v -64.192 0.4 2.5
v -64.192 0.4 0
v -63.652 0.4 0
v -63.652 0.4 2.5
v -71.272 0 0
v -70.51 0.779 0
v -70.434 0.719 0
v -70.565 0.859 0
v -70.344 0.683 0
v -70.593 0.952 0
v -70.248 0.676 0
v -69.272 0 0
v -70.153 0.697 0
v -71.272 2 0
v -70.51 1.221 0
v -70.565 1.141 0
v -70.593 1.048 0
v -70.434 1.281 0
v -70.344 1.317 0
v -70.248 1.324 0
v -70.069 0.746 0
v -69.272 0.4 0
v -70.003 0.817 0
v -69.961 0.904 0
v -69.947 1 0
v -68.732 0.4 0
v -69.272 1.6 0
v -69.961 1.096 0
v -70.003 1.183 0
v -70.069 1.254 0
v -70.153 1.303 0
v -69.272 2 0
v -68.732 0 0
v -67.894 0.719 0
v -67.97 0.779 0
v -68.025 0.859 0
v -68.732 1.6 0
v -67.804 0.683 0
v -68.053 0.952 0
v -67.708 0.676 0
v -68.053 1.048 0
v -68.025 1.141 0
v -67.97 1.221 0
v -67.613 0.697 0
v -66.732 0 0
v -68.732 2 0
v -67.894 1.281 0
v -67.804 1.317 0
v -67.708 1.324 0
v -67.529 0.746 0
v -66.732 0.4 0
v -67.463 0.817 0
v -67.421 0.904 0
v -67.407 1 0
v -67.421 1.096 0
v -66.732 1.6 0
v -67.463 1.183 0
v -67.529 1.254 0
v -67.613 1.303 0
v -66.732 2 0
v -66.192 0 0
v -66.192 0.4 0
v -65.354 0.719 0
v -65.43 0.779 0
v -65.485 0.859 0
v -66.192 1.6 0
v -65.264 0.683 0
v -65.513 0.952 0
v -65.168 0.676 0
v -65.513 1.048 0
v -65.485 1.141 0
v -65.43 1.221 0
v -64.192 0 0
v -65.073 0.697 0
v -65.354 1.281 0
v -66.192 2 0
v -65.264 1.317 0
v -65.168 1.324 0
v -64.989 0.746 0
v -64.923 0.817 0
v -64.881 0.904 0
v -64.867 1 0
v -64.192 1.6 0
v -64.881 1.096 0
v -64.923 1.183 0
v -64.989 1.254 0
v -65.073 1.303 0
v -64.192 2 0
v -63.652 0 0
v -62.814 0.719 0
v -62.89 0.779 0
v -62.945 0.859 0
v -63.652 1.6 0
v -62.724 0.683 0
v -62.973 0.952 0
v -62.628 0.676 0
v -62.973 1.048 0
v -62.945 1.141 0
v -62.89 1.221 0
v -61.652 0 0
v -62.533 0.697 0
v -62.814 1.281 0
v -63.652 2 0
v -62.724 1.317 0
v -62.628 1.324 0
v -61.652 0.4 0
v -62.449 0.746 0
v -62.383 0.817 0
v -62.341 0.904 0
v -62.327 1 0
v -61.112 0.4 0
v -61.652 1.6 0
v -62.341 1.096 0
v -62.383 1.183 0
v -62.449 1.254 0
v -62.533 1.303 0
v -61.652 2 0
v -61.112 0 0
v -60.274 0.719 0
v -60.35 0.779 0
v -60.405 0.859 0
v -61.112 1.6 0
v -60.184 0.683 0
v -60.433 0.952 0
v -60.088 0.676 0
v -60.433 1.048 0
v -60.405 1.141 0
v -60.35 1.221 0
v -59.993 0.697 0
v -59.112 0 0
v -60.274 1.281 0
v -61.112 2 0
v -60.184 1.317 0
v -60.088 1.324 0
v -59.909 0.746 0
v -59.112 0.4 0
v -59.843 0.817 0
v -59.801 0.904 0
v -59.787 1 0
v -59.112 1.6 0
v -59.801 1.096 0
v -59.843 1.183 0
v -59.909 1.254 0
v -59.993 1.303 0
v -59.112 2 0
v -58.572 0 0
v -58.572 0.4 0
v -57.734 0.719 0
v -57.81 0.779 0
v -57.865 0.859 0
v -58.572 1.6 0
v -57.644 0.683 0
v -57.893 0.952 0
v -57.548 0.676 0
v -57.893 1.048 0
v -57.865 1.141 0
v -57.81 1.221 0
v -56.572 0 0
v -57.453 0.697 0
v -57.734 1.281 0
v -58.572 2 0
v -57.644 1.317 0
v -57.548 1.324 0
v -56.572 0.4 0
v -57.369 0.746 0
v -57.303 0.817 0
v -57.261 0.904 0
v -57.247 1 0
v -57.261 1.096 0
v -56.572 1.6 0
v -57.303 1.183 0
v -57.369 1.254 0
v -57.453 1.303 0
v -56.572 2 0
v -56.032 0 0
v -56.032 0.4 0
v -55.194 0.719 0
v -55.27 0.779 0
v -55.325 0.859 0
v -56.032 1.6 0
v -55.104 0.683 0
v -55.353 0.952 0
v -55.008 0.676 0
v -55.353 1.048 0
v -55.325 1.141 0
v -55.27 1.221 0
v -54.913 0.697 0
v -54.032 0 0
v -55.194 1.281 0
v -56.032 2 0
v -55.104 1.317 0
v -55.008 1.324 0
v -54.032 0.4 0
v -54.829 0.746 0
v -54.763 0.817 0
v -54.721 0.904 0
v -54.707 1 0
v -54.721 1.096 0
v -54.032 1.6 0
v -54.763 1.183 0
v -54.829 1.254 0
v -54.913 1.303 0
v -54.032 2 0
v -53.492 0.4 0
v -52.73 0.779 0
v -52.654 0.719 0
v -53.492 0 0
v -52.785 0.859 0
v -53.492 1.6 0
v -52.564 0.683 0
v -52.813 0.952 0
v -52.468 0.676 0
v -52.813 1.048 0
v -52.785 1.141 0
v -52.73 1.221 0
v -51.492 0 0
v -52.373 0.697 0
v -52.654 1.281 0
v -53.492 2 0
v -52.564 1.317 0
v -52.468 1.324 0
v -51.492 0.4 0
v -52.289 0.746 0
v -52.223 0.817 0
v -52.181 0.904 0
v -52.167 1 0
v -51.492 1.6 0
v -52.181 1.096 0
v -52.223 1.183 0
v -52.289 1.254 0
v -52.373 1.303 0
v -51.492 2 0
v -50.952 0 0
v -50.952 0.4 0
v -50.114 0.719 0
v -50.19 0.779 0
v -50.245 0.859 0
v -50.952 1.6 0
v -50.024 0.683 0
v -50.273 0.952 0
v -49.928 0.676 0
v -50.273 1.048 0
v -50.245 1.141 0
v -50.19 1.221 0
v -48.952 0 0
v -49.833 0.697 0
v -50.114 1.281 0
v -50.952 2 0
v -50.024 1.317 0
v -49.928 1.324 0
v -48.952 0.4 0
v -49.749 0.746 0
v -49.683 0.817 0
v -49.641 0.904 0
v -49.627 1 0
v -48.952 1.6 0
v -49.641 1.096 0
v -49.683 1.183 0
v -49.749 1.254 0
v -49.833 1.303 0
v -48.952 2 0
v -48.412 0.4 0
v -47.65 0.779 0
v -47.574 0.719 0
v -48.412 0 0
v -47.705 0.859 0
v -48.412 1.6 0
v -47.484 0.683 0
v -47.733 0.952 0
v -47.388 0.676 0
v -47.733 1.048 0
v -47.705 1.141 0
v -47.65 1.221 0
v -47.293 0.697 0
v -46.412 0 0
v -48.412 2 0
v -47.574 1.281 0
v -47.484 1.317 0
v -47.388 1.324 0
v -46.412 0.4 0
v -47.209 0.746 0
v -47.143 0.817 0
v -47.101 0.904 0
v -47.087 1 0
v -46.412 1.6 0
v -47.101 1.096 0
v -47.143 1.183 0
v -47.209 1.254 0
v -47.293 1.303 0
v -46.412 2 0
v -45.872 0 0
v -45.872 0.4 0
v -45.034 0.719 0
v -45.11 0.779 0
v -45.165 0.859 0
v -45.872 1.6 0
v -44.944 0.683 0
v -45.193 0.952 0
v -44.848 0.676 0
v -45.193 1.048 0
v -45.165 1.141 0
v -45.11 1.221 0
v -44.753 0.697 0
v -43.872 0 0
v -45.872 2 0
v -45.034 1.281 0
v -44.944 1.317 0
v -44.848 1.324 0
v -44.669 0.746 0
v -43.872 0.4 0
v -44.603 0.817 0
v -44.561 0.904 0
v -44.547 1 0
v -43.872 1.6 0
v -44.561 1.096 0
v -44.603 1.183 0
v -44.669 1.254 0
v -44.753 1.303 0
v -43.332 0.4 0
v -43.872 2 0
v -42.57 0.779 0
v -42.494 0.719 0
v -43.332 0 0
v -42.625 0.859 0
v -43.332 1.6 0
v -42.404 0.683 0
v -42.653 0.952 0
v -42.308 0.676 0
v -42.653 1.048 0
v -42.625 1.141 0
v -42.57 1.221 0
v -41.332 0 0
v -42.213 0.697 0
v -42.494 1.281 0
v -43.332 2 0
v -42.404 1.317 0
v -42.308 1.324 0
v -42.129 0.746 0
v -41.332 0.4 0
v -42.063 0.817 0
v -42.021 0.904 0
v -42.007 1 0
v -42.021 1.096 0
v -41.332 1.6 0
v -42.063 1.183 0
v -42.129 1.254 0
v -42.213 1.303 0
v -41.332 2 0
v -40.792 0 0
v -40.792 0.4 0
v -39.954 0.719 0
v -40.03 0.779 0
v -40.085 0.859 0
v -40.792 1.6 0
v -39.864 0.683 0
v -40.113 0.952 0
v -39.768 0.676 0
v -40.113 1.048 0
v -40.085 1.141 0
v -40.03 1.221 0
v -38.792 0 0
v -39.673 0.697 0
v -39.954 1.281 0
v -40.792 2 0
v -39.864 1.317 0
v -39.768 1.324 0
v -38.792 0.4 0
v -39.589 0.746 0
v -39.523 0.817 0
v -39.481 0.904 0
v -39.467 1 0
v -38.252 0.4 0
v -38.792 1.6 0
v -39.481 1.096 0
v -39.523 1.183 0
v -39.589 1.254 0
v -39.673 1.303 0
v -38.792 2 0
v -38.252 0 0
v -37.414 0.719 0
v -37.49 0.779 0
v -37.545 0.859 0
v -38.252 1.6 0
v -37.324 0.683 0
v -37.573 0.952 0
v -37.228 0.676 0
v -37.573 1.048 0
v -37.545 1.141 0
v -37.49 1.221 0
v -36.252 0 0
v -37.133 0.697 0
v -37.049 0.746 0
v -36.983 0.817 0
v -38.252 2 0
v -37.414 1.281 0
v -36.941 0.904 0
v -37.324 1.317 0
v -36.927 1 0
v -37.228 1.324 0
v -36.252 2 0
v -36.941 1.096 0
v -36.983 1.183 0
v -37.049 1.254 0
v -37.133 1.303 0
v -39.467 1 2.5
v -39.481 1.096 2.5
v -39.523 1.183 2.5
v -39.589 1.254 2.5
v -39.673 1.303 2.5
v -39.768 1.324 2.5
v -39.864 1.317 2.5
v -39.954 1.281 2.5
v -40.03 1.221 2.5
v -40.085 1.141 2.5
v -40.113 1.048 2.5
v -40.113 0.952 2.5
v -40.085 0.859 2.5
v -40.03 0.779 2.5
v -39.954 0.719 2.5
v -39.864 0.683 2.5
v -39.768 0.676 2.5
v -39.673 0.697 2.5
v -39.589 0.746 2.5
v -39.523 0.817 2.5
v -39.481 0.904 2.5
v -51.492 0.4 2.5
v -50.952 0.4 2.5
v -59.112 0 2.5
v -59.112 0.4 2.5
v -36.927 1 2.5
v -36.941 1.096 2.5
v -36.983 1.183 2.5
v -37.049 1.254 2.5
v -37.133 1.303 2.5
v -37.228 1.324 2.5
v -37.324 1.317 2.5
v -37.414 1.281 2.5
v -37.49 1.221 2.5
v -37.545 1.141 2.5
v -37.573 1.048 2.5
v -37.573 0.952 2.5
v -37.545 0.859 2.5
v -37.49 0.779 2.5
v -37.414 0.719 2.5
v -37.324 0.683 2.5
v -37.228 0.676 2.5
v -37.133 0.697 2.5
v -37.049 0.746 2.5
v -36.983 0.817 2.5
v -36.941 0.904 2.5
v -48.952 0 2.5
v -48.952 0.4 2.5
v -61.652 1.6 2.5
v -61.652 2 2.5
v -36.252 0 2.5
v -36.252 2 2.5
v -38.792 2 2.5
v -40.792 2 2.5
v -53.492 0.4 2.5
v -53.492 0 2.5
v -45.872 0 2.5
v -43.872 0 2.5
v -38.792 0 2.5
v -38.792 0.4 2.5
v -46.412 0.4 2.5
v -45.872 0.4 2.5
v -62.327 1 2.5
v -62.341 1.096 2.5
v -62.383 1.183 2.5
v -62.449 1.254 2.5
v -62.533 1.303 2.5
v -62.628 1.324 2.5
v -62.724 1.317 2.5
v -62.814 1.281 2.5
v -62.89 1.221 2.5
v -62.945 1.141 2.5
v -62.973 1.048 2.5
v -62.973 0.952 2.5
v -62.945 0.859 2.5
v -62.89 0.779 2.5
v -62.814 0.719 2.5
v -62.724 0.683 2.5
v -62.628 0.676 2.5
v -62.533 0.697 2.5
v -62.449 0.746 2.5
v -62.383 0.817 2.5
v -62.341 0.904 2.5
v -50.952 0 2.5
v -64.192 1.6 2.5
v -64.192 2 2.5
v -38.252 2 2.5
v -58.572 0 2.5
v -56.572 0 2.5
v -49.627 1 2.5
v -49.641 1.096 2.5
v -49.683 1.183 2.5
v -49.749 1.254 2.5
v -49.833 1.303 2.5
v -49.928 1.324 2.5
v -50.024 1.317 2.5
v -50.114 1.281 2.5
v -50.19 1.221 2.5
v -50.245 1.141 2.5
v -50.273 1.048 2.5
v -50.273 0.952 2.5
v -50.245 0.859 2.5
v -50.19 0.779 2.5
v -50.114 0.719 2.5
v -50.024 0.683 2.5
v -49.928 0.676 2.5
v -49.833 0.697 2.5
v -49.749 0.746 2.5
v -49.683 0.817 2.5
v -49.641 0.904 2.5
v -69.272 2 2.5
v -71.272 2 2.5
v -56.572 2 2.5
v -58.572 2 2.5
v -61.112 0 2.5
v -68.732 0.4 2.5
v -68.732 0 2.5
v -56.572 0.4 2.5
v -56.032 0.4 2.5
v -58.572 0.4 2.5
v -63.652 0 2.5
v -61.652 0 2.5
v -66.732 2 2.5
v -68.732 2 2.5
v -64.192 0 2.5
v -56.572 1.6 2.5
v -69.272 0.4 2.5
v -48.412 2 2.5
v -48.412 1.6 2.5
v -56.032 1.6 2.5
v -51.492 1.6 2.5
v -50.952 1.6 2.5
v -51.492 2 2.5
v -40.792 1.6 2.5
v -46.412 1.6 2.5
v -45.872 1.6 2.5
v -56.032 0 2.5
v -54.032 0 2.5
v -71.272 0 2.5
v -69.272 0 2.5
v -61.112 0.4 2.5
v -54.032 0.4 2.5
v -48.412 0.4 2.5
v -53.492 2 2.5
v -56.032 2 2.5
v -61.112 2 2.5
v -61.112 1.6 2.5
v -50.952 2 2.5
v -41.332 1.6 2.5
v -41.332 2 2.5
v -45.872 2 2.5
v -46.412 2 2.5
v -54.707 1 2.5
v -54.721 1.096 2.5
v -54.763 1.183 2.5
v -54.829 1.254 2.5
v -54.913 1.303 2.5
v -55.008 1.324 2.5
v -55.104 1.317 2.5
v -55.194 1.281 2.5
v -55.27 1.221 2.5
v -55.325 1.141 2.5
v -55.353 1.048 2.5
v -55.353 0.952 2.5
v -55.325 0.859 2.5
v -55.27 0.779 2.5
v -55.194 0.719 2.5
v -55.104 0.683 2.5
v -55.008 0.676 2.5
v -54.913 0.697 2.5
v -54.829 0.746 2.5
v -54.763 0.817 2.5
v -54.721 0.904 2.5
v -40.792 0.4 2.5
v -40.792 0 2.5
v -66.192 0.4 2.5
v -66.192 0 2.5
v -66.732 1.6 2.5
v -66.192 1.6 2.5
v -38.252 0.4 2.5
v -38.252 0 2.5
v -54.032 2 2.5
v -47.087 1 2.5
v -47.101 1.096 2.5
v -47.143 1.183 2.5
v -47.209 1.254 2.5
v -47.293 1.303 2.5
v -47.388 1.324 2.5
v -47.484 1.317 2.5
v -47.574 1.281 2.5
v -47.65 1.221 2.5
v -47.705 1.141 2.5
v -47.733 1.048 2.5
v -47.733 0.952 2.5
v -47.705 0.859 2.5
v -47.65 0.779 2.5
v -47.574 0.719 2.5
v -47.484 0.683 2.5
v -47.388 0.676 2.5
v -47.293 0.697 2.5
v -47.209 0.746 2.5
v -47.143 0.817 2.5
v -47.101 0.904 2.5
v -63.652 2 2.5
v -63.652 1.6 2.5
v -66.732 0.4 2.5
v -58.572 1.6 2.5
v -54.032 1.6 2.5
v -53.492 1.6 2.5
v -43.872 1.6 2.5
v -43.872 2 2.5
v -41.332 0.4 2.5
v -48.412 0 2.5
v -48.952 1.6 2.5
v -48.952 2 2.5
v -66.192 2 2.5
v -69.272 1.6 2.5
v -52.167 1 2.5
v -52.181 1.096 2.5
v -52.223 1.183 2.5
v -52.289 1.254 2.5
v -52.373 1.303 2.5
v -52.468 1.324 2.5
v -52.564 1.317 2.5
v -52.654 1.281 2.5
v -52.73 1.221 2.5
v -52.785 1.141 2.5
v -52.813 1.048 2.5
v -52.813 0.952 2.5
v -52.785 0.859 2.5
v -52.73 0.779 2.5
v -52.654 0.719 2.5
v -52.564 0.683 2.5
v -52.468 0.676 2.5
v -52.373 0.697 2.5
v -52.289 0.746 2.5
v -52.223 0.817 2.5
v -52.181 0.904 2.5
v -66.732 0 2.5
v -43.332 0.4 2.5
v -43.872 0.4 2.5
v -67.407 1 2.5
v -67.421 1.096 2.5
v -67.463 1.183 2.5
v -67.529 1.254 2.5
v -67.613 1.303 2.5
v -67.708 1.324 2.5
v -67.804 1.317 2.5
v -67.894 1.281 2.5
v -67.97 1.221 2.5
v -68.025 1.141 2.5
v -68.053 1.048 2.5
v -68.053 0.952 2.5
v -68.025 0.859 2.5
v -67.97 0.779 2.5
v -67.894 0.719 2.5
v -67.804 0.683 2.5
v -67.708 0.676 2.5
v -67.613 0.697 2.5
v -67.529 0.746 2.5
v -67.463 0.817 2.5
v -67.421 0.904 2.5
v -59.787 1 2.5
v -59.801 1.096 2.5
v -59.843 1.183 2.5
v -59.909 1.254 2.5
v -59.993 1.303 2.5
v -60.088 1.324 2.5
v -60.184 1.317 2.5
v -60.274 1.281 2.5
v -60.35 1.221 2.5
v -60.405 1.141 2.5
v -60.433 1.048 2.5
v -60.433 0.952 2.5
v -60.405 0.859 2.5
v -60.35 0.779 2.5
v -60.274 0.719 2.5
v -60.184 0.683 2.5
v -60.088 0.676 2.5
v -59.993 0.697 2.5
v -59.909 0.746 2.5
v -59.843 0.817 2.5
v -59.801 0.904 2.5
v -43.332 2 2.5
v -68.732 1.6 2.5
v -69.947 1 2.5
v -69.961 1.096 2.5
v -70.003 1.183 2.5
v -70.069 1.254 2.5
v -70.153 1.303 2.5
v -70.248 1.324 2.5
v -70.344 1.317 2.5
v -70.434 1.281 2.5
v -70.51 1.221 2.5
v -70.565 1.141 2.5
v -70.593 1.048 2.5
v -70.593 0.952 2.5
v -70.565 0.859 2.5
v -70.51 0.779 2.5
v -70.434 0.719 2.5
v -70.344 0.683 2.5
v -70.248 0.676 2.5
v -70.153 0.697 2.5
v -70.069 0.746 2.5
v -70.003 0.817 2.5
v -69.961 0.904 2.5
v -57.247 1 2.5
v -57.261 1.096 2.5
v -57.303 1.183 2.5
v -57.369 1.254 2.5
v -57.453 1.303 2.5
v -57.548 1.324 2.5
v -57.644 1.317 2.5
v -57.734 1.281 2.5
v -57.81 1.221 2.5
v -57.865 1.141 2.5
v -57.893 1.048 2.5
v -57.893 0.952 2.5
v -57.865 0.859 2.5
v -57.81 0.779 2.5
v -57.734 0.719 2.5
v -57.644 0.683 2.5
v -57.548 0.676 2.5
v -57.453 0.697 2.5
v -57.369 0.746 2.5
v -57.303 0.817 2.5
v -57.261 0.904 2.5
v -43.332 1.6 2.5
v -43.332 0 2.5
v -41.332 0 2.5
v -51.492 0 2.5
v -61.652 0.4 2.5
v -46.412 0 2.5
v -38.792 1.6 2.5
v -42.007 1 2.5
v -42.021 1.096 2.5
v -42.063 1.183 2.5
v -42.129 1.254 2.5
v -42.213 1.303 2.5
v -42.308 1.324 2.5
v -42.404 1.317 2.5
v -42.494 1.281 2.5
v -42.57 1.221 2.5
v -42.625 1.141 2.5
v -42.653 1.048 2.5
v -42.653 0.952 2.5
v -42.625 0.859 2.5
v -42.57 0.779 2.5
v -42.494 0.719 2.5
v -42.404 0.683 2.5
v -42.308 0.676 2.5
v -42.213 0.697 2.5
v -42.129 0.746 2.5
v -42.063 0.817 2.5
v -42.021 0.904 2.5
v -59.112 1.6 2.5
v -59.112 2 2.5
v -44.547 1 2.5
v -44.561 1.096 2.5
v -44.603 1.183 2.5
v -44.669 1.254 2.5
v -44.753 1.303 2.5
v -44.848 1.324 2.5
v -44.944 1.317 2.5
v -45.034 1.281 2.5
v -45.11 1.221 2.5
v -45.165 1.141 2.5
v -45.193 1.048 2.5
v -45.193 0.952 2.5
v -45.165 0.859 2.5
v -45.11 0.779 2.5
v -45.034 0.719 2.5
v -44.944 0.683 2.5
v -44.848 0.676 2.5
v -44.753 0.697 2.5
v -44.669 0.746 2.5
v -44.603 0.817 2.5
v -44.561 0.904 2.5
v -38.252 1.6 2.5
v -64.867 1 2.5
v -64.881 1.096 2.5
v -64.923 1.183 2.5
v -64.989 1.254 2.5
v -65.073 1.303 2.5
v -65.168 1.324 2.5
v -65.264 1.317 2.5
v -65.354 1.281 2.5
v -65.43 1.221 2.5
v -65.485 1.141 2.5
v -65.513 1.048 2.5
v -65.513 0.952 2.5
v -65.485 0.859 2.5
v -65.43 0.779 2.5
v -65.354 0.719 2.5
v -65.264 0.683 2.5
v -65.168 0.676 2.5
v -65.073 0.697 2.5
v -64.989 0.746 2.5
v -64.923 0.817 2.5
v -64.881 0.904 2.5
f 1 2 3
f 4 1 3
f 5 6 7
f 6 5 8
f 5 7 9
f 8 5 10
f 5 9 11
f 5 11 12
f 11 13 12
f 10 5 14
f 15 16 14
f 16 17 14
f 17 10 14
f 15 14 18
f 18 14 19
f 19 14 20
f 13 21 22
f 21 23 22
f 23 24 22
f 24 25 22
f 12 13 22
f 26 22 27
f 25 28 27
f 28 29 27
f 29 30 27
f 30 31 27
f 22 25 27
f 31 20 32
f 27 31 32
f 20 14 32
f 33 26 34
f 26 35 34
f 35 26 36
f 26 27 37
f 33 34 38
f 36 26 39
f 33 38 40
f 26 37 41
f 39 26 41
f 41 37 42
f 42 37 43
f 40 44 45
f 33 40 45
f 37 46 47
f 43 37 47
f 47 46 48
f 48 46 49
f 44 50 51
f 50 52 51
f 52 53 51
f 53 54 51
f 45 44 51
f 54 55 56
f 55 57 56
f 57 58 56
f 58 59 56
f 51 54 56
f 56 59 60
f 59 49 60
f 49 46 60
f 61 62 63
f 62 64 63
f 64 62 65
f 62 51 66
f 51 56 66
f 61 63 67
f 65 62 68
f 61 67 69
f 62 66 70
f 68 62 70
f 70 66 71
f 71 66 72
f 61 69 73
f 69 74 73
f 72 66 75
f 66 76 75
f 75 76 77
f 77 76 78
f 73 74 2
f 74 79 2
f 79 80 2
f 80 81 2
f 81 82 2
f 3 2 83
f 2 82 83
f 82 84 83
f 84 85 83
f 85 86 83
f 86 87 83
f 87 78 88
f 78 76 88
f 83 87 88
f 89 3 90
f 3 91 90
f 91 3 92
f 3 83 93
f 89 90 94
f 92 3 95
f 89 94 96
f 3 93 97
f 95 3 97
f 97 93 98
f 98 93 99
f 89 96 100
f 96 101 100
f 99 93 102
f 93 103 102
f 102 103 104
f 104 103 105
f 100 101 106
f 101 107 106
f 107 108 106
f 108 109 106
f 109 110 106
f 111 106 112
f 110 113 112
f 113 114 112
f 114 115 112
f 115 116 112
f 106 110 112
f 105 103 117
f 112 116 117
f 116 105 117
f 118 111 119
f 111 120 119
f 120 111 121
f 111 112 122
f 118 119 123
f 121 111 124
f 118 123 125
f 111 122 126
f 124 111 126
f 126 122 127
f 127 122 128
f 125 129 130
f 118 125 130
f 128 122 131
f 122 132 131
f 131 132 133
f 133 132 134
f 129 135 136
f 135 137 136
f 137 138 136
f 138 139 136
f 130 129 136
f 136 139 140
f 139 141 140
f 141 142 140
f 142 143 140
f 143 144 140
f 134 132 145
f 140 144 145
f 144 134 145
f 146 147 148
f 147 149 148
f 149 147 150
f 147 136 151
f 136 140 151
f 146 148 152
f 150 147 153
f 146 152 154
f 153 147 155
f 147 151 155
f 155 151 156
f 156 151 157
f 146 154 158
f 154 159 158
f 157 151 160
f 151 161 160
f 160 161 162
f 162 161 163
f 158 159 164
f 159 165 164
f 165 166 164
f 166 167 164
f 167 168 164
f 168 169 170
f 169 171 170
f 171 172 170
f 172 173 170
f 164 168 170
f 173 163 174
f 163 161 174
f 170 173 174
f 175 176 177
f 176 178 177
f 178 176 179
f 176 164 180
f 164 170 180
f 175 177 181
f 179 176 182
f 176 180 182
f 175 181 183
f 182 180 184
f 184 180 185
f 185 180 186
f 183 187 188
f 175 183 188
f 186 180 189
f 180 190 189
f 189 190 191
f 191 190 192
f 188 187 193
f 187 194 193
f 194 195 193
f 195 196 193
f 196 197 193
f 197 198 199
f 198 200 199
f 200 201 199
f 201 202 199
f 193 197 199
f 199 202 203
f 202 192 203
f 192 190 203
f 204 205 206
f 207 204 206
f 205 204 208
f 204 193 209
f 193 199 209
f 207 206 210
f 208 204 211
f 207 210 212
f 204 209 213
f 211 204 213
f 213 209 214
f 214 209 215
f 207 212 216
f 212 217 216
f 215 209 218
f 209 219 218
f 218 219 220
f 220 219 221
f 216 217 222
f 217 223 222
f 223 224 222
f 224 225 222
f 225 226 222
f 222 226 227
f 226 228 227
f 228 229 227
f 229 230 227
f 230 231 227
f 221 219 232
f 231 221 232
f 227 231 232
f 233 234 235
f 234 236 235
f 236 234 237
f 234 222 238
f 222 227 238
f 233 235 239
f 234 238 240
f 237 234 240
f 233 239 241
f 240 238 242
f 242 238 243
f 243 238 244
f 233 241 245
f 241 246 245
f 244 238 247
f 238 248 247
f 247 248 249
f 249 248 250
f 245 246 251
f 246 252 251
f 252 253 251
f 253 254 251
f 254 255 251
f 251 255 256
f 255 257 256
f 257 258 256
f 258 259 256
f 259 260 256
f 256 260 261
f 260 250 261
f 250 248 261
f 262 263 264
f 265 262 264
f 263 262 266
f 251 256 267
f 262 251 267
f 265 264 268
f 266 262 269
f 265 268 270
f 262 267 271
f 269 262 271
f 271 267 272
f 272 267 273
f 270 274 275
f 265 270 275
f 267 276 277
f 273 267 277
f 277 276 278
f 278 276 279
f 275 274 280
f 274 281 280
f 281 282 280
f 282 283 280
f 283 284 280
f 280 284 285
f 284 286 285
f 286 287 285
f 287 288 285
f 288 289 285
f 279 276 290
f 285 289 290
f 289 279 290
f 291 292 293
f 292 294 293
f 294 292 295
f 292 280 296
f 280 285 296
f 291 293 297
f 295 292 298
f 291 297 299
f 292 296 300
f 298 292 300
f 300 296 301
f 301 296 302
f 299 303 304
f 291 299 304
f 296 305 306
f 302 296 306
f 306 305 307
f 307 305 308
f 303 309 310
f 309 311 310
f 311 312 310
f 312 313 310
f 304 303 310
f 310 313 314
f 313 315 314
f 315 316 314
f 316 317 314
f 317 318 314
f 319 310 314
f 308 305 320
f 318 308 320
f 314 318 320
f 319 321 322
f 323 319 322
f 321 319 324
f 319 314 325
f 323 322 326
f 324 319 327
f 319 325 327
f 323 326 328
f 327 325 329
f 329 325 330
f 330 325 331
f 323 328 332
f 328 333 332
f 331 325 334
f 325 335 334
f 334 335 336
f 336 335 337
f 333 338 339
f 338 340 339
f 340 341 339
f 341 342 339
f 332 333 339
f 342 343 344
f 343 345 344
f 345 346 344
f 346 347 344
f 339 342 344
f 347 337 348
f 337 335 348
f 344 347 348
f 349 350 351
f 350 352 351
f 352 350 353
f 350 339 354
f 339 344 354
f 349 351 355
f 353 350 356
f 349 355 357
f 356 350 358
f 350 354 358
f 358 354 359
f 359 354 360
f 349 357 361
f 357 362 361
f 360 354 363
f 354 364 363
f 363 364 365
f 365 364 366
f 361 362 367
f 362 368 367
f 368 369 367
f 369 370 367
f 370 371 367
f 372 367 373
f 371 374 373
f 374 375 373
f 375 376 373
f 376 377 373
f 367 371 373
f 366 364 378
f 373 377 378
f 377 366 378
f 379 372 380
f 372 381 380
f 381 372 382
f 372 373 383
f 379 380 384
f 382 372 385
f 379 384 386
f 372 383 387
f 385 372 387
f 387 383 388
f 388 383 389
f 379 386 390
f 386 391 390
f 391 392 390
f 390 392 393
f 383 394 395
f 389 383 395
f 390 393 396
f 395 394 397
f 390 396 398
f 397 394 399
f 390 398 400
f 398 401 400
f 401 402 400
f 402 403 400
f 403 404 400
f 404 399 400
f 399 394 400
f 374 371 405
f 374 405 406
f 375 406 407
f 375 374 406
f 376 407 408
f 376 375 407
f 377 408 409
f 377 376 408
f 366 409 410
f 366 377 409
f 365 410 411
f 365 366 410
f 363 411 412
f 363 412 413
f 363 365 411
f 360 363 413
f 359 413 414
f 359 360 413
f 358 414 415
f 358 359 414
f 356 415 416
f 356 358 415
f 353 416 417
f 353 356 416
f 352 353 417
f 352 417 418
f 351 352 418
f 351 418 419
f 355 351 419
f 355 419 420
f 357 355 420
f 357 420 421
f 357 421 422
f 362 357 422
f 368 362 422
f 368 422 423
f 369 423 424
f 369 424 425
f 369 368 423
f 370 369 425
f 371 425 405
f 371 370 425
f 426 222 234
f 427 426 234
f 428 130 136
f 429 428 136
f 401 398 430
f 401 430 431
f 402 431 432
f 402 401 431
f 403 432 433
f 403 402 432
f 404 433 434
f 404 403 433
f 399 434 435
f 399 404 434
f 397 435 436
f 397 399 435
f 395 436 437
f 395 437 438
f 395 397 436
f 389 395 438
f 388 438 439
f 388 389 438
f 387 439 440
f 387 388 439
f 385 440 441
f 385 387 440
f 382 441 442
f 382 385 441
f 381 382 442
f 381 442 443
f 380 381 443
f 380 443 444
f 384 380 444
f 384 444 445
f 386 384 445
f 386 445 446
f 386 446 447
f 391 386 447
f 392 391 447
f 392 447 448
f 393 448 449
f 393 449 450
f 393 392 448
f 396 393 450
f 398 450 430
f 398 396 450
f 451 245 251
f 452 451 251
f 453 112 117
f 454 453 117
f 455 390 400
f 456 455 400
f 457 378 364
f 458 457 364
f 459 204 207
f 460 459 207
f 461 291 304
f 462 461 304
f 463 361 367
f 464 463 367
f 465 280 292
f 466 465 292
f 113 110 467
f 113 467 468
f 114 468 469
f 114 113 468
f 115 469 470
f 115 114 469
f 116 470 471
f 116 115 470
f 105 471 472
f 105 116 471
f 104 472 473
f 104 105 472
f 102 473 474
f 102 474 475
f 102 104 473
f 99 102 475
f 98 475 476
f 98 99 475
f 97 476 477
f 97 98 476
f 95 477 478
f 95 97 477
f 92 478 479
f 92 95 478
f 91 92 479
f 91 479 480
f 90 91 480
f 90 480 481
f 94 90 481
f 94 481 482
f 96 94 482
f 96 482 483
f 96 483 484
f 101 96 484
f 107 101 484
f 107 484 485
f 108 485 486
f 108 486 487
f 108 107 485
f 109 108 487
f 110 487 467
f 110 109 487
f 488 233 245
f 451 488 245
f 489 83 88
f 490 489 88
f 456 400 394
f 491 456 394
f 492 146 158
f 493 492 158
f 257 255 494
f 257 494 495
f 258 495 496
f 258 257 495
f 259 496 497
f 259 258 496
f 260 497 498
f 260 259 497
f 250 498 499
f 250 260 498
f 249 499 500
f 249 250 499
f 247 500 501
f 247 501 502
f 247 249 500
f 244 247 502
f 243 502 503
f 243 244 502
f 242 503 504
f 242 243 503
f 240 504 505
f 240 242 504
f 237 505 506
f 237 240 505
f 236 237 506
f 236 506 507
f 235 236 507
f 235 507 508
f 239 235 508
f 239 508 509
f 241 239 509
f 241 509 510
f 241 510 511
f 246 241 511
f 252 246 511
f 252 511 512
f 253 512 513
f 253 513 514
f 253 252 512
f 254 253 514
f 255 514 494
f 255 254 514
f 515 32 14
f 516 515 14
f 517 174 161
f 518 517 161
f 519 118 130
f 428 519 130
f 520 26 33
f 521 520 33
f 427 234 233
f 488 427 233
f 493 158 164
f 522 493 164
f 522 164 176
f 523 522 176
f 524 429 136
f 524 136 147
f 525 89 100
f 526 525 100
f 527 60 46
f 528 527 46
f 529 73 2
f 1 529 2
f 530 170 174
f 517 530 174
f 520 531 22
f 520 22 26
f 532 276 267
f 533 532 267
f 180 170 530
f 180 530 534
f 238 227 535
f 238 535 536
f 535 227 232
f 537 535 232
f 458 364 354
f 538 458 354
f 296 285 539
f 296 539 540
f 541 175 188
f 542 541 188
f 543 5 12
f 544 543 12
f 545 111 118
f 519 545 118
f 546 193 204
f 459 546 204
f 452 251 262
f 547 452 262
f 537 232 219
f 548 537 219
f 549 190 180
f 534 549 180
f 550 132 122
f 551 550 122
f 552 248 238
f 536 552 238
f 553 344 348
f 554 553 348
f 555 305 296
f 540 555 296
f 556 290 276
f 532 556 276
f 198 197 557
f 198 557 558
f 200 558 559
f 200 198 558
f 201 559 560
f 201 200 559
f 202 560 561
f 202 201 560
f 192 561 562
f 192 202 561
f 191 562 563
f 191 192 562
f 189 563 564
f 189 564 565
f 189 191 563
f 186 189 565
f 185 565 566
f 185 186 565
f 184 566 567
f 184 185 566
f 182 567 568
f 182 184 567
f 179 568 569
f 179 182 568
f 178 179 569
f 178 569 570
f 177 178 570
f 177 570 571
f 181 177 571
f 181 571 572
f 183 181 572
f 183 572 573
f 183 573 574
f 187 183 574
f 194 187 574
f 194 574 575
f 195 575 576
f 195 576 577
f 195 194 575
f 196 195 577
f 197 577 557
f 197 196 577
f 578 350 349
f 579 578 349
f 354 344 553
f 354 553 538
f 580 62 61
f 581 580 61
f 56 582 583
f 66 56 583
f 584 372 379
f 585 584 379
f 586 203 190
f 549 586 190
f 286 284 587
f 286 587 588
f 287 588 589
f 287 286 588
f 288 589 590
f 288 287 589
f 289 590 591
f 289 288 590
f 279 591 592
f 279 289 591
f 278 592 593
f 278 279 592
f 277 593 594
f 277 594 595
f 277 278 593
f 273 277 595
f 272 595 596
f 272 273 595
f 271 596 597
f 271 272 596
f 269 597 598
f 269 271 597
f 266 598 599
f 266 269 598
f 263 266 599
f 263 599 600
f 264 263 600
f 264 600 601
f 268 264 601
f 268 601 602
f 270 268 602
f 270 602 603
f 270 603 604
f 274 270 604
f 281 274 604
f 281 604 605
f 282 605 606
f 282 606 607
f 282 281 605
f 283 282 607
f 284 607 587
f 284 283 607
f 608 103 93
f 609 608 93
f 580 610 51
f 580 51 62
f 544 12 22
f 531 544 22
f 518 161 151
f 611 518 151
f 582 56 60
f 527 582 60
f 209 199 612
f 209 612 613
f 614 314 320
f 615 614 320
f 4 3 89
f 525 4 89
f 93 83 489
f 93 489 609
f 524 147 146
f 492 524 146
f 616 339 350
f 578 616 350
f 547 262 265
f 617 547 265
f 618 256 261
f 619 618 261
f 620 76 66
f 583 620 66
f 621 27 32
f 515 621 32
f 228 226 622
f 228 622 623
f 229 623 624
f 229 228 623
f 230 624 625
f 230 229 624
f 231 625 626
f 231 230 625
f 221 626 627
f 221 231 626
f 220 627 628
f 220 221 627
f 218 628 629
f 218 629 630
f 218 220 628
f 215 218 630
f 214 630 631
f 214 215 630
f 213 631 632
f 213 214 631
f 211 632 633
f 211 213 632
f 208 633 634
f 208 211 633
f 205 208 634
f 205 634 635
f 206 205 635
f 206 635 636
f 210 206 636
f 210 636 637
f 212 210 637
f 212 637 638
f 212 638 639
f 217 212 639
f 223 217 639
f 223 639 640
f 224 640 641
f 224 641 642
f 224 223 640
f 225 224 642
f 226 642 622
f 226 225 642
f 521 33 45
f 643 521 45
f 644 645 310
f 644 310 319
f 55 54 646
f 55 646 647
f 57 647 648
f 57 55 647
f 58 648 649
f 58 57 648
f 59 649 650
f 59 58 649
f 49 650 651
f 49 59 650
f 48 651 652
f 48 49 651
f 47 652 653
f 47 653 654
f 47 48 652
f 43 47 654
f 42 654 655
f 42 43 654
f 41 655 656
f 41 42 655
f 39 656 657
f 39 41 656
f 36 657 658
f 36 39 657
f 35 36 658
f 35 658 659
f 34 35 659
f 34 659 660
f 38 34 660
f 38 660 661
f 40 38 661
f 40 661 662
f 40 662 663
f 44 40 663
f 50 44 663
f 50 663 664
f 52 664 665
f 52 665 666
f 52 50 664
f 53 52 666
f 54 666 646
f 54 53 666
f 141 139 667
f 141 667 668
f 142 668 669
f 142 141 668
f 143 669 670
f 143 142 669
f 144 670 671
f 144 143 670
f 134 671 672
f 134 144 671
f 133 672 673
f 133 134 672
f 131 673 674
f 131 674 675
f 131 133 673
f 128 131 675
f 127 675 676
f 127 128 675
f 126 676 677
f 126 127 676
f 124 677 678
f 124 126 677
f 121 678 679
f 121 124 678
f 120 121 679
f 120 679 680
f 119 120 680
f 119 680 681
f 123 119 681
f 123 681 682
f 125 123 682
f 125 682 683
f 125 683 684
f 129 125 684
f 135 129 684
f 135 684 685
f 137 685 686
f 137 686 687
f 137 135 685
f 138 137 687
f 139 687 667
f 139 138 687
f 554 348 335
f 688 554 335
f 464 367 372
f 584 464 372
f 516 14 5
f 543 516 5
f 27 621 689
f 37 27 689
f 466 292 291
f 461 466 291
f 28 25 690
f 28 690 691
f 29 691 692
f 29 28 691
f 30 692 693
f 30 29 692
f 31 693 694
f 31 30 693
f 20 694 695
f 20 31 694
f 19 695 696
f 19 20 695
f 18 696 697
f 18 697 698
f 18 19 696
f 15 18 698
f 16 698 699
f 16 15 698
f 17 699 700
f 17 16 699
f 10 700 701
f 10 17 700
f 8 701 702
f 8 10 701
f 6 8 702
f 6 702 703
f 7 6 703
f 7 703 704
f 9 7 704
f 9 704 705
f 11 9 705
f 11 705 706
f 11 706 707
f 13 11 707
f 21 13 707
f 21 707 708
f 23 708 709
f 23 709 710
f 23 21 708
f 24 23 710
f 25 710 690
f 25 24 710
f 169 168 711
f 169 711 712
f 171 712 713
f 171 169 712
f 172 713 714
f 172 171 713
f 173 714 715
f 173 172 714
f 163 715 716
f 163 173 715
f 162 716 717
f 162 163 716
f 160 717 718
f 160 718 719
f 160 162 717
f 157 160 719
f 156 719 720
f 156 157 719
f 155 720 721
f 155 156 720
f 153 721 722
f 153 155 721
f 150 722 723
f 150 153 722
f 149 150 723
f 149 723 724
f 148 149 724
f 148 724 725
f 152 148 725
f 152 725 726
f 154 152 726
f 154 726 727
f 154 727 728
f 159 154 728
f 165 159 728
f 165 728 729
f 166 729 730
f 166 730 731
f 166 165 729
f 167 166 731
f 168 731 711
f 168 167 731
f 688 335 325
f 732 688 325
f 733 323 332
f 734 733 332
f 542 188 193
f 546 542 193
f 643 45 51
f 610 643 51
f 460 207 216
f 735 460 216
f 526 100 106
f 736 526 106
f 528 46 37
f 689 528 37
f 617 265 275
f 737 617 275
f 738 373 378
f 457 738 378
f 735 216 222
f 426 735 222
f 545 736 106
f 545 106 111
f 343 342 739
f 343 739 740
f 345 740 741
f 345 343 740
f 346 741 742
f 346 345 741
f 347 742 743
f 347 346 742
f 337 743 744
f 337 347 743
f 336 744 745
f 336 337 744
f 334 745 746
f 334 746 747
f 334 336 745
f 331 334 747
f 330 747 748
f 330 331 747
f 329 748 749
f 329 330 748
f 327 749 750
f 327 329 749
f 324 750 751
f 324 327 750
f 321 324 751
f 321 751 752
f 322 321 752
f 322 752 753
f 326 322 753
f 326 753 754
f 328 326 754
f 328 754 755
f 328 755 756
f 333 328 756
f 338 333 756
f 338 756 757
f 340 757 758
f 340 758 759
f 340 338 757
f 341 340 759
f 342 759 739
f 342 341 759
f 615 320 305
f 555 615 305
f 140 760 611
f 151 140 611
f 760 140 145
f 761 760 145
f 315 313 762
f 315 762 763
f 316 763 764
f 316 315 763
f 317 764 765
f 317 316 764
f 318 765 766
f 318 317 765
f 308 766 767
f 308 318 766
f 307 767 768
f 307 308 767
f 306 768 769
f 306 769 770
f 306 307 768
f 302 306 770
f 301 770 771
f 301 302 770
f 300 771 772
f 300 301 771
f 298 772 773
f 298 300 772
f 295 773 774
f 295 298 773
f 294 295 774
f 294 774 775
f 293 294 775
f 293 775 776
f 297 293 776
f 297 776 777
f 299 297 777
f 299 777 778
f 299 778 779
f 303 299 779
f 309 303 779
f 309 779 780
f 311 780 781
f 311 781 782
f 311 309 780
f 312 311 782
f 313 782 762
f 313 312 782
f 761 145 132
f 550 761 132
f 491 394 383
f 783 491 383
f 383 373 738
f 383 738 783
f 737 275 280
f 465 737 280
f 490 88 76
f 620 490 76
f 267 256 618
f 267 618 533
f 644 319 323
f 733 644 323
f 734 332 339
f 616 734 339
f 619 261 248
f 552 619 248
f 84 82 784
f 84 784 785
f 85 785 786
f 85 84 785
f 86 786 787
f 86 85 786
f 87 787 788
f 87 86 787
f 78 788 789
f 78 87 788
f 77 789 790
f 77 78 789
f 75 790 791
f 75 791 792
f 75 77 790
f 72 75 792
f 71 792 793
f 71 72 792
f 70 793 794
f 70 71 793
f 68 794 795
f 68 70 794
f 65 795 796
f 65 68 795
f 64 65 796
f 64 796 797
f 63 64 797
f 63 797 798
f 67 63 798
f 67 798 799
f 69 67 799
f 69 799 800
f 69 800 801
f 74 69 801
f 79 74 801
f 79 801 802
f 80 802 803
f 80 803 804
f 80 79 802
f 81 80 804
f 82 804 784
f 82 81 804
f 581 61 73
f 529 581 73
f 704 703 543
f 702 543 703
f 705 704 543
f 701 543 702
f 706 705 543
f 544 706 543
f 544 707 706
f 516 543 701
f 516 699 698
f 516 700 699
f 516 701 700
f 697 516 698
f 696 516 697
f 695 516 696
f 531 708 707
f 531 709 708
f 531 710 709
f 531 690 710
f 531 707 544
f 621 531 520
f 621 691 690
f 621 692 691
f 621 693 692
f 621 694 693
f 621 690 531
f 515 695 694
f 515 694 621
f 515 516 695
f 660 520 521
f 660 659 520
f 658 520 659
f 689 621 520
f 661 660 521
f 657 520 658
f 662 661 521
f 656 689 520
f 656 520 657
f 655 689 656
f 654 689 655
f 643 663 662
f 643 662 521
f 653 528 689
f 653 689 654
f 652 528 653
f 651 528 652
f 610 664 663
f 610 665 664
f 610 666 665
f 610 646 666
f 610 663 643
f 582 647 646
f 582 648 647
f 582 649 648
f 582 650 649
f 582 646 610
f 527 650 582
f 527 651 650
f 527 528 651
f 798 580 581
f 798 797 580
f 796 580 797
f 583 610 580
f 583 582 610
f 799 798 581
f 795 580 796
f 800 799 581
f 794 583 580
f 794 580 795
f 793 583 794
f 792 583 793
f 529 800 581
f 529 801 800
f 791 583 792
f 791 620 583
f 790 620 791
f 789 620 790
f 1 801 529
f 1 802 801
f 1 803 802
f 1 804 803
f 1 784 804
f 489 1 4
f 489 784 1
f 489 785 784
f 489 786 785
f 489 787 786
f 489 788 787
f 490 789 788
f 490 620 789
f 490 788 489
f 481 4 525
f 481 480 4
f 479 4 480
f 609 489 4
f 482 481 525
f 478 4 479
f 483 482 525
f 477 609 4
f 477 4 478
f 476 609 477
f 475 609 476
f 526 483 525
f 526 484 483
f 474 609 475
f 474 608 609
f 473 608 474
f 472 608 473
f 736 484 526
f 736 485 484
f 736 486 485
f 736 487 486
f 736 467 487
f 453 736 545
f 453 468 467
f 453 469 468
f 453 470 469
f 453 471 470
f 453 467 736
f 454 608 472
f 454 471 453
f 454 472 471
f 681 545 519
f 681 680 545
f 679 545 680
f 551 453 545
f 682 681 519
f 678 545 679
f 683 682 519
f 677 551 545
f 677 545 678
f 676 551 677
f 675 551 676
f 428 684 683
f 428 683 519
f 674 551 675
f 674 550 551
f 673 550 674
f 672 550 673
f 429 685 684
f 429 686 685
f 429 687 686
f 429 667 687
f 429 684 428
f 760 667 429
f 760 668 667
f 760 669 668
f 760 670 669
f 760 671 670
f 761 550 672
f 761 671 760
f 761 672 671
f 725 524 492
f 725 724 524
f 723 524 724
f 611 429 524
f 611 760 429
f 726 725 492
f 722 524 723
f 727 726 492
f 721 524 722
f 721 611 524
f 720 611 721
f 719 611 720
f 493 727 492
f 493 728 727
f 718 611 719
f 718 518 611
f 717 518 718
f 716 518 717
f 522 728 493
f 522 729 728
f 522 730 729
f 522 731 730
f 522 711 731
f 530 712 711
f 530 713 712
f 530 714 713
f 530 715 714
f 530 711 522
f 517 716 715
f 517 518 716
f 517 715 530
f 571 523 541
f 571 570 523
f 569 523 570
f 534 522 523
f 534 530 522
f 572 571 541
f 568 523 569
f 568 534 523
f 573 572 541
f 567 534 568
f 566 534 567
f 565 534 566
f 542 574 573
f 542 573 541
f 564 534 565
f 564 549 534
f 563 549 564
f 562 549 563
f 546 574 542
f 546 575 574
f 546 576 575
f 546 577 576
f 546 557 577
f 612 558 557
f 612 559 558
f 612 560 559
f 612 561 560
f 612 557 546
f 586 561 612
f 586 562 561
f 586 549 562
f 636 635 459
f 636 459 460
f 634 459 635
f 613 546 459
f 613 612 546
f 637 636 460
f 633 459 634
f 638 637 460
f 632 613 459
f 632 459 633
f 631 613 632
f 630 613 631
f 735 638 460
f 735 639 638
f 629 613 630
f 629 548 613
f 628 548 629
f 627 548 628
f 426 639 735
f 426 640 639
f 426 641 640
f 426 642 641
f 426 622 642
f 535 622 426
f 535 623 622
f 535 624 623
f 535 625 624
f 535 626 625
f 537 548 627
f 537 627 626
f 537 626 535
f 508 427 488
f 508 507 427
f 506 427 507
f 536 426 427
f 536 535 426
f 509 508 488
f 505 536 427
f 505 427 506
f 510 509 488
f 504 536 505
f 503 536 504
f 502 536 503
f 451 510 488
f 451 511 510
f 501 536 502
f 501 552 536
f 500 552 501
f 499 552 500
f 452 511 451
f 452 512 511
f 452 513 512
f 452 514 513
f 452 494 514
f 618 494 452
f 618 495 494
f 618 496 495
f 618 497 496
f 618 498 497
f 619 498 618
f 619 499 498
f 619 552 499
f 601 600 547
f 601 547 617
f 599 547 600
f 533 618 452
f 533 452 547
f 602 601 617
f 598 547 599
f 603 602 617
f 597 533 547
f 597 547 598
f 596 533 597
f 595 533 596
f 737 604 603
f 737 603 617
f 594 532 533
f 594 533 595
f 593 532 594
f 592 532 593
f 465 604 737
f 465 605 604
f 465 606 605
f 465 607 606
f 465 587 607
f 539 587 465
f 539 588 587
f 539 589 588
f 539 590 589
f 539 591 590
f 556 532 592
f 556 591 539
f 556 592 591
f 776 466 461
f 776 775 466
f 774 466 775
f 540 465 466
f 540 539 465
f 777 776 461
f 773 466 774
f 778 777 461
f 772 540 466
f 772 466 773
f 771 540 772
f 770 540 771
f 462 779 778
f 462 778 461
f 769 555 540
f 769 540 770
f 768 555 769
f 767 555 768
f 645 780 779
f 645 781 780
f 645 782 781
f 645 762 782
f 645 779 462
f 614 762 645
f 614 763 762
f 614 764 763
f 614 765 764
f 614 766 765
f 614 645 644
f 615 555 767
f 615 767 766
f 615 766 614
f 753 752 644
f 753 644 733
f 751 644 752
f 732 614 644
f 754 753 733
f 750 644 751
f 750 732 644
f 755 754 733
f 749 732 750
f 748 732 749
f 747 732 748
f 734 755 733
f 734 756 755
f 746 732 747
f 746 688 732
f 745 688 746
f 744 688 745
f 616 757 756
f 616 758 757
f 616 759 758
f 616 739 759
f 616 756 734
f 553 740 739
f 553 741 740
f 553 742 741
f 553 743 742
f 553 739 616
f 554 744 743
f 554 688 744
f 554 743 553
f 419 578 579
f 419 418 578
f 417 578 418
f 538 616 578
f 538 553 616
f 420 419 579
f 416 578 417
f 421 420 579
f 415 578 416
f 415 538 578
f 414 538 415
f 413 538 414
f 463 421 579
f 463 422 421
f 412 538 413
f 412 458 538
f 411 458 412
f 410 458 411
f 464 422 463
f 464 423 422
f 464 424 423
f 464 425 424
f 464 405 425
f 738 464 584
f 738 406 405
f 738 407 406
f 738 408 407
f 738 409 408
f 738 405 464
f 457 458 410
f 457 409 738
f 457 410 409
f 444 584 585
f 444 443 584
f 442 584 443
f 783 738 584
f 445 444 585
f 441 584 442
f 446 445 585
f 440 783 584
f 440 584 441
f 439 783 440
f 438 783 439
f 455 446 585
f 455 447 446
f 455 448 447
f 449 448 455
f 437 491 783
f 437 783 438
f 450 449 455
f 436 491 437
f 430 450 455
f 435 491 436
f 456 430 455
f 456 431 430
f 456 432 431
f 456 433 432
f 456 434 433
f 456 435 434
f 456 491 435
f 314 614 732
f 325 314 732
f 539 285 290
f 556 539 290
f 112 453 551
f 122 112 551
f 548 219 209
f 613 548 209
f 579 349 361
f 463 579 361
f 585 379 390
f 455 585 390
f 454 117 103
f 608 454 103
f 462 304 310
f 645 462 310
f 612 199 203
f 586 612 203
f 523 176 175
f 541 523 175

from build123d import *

# Parameters (mm, degrees)
F0_R     = 0.325
F0_W     = 0.54
F0_H     = 1.2
F1_DEPTH = 2.5


with BuildPart() as f1:
    # F0 (on Top) → F1 (new body)
    with BuildSketch(Plane.XY):
        Polygon((-71.271986, 0), (-69.271986, 0), (-69.271986, 0.4), (-69.271986, 1.6), (-69.271986, 2), (-71.271986, 2), align=None)
        with Locations((-70.271986, 1)):
            Circle(F0_R, mode=Mode.SUBTRACT)
        with Locations((-69.001986, 1)):
            Rectangle(F0_W, F0_H)
        Polygon((-68.731986, 1.6), (-68.731986, 0.4), (-68.731986, 0), (-66.731986, 0), (-66.731986, 0.4), (-66.731986, 1.6), (-66.731986, 2), (-68.731986, 2), align=None)
        with Locations((-67.731986, 1)):
            Circle(F0_R, mode=Mode.SUBTRACT)
        with Locations((-66.461986, 1)):
            Rectangle(F0_W, F0_H)
        Polygon((-66.191986, 1.6), (-66.191986, 0.4), (-66.191986, 0), (-64.191986, 0), (-64.191986, 0.4), (-64.191986, 1.6), (-64.191986, 2), (-66.191986, 2), align=None)
        with Locations((-65.191986, 1)):
            Circle(F0_R, mode=Mode.SUBTRACT)
        with Locations((-63.921986, 1)):
            Rectangle(F0_W, F0_H)
        Polygon((-63.651986, 1.6), (-63.651986, 0.4), (-63.651986, 0), (-61.651986, 0), (-61.651986, 0.4), (-61.651986, 1.6), (-61.651986, 2), (-63.651986, 2), align=None)
        with Locations((-62.651986, 1)):
            Circle(F0_R, mode=Mode.SUBTRACT)
        with Locations((-61.381986, 1)):
            Rectangle(F0_W, F0_H)
        Polygon((-61.111986, 1.6), (-61.111986, 0.4), (-61.111986, 0), (-59.111986, 0), (-59.111986, 0.4), (-59.111986, 1.6), (-59.111986, 2), (-61.111986, 2), align=None)
        with Locations((-60.111986, 1)):
            Circle(F0_R, mode=Mode.SUBTRACT)
        with Locations((-58.841986, 1)):
            Rectangle(F0_W, F0_H)
        Polygon((-58.571986, 1.6), (-58.571986, 0.4), (-58.571986, 0), (-56.571986, 0), (-56.571986, 0.4), (-56.571986, 1.6), (-56.571986, 2), (-58.571986, 2), align=None)
        with Locations((-57.571986, 1)):
            Circle(F0_R, mode=Mode.SUBTRACT)
        with Locations((-56.301986, 1)):
            Rectangle(F0_W, F0_H)
        Polygon((-56.031986, 1.6), (-56.031986, 0.4), (-56.031986, 0), (-54.031986, 0), (-54.031986, 0.4), (-54.031986, 1.6), (-54.031986, 2), (-56.031986, 2), align=None)
        with Locations((-55.031986, 1)):
            Circle(F0_R, mode=Mode.SUBTRACT)
        with Locations((-53.761986, 1)):
            Rectangle(F0_W, F0_H)
        Polygon((-53.491986, 1.6), (-53.491986, 0.4), (-53.491986, 0), (-51.491986, 0), (-51.491986, 0.4), (-51.491986, 1.6), (-51.491986, 2), (-53.491986, 2), align=None)
        with Locations((-52.491986, 1)):
            Circle(F0_R, mode=Mode.SUBTRACT)
        with Locations((-51.221986, 1)):
            Rectangle(F0_W, F0_H)
        Polygon((-50.951986, 1.6), (-50.951986, 0.4), (-50.951986, 0), (-48.951986, 0), (-48.951986, 0.4), (-48.951986, 1.6), (-48.951986, 2), (-50.951986, 2), align=None)
        with Locations((-49.951986, 1)):
            Circle(F0_R, mode=Mode.SUBTRACT)
        with Locations((-48.681986, 1)):
            Rectangle(F0_W, F0_H)
        Polygon((-48.411986, 1.6), (-48.411986, 0.4), (-48.411986, 0), (-46.411986, 0), (-46.411986, 0.4), (-46.411986, 1.6), (-46.411986, 2), (-48.411986, 2), align=None)
        with Locations((-47.411986, 1)):
            Circle(F0_R, mode=Mode.SUBTRACT)
        with Locations((-46.141986, 1)):
            Rectangle(F0_W, F0_H)
        Polygon((-45.871986, 1.6), (-45.871986, 0.4), (-45.871986, 0), (-43.871986, 0), (-43.871986, 0.4), (-43.871986, 1.6), (-43.871986, 2), (-45.871986, 2), align=None)
        with Locations((-44.871986, 1)):
            Circle(F0_R, mode=Mode.SUBTRACT)
        with Locations((-43.601986, 1)):
            Rectangle(F0_W, F0_H)
        Polygon((-43.331986, 1.6), (-43.331986, 0.4), (-43.331986, 0), (-41.331986, 0), (-41.331986, 0.4), (-41.331986, 1.6), (-41.331986, 2), (-43.331986, 2), align=None)
        with Locations((-42.331986, 1)):
            Circle(F0_R, mode=Mode.SUBTRACT)
        with Locations((-41.061986, 1)):
            Rectangle(F0_W, F0_H)
        Polygon((-40.791986, 1.6), (-40.791986, 0.4), (-40.791986, 0), (-38.791986, 0), (-38.791986, 0.4), (-38.791986, 1.6), (-38.791986, 2), (-40.791986, 2), align=None)
        with Locations((-39.791986, 1)):
            Circle(F0_R, mode=Mode.SUBTRACT)
        with Locations((-38.521986, 1)):
            Rectangle(F0_W, F0_H)
        Polygon((-38.251986, 1.6), (-38.251986, 0.4), (-38.251986, 0), (-36.251986, 0), (-36.251986, 0.4), (-36.251986, 1.6), (-36.251986, 2), (-38.251986, 2), align=None)
        with Locations((-37.251986, 1)):
            Circle(F0_R, mode=Mode.SUBTRACT)
    extrude(amount=F1_DEPTH)


solid = f1.part
